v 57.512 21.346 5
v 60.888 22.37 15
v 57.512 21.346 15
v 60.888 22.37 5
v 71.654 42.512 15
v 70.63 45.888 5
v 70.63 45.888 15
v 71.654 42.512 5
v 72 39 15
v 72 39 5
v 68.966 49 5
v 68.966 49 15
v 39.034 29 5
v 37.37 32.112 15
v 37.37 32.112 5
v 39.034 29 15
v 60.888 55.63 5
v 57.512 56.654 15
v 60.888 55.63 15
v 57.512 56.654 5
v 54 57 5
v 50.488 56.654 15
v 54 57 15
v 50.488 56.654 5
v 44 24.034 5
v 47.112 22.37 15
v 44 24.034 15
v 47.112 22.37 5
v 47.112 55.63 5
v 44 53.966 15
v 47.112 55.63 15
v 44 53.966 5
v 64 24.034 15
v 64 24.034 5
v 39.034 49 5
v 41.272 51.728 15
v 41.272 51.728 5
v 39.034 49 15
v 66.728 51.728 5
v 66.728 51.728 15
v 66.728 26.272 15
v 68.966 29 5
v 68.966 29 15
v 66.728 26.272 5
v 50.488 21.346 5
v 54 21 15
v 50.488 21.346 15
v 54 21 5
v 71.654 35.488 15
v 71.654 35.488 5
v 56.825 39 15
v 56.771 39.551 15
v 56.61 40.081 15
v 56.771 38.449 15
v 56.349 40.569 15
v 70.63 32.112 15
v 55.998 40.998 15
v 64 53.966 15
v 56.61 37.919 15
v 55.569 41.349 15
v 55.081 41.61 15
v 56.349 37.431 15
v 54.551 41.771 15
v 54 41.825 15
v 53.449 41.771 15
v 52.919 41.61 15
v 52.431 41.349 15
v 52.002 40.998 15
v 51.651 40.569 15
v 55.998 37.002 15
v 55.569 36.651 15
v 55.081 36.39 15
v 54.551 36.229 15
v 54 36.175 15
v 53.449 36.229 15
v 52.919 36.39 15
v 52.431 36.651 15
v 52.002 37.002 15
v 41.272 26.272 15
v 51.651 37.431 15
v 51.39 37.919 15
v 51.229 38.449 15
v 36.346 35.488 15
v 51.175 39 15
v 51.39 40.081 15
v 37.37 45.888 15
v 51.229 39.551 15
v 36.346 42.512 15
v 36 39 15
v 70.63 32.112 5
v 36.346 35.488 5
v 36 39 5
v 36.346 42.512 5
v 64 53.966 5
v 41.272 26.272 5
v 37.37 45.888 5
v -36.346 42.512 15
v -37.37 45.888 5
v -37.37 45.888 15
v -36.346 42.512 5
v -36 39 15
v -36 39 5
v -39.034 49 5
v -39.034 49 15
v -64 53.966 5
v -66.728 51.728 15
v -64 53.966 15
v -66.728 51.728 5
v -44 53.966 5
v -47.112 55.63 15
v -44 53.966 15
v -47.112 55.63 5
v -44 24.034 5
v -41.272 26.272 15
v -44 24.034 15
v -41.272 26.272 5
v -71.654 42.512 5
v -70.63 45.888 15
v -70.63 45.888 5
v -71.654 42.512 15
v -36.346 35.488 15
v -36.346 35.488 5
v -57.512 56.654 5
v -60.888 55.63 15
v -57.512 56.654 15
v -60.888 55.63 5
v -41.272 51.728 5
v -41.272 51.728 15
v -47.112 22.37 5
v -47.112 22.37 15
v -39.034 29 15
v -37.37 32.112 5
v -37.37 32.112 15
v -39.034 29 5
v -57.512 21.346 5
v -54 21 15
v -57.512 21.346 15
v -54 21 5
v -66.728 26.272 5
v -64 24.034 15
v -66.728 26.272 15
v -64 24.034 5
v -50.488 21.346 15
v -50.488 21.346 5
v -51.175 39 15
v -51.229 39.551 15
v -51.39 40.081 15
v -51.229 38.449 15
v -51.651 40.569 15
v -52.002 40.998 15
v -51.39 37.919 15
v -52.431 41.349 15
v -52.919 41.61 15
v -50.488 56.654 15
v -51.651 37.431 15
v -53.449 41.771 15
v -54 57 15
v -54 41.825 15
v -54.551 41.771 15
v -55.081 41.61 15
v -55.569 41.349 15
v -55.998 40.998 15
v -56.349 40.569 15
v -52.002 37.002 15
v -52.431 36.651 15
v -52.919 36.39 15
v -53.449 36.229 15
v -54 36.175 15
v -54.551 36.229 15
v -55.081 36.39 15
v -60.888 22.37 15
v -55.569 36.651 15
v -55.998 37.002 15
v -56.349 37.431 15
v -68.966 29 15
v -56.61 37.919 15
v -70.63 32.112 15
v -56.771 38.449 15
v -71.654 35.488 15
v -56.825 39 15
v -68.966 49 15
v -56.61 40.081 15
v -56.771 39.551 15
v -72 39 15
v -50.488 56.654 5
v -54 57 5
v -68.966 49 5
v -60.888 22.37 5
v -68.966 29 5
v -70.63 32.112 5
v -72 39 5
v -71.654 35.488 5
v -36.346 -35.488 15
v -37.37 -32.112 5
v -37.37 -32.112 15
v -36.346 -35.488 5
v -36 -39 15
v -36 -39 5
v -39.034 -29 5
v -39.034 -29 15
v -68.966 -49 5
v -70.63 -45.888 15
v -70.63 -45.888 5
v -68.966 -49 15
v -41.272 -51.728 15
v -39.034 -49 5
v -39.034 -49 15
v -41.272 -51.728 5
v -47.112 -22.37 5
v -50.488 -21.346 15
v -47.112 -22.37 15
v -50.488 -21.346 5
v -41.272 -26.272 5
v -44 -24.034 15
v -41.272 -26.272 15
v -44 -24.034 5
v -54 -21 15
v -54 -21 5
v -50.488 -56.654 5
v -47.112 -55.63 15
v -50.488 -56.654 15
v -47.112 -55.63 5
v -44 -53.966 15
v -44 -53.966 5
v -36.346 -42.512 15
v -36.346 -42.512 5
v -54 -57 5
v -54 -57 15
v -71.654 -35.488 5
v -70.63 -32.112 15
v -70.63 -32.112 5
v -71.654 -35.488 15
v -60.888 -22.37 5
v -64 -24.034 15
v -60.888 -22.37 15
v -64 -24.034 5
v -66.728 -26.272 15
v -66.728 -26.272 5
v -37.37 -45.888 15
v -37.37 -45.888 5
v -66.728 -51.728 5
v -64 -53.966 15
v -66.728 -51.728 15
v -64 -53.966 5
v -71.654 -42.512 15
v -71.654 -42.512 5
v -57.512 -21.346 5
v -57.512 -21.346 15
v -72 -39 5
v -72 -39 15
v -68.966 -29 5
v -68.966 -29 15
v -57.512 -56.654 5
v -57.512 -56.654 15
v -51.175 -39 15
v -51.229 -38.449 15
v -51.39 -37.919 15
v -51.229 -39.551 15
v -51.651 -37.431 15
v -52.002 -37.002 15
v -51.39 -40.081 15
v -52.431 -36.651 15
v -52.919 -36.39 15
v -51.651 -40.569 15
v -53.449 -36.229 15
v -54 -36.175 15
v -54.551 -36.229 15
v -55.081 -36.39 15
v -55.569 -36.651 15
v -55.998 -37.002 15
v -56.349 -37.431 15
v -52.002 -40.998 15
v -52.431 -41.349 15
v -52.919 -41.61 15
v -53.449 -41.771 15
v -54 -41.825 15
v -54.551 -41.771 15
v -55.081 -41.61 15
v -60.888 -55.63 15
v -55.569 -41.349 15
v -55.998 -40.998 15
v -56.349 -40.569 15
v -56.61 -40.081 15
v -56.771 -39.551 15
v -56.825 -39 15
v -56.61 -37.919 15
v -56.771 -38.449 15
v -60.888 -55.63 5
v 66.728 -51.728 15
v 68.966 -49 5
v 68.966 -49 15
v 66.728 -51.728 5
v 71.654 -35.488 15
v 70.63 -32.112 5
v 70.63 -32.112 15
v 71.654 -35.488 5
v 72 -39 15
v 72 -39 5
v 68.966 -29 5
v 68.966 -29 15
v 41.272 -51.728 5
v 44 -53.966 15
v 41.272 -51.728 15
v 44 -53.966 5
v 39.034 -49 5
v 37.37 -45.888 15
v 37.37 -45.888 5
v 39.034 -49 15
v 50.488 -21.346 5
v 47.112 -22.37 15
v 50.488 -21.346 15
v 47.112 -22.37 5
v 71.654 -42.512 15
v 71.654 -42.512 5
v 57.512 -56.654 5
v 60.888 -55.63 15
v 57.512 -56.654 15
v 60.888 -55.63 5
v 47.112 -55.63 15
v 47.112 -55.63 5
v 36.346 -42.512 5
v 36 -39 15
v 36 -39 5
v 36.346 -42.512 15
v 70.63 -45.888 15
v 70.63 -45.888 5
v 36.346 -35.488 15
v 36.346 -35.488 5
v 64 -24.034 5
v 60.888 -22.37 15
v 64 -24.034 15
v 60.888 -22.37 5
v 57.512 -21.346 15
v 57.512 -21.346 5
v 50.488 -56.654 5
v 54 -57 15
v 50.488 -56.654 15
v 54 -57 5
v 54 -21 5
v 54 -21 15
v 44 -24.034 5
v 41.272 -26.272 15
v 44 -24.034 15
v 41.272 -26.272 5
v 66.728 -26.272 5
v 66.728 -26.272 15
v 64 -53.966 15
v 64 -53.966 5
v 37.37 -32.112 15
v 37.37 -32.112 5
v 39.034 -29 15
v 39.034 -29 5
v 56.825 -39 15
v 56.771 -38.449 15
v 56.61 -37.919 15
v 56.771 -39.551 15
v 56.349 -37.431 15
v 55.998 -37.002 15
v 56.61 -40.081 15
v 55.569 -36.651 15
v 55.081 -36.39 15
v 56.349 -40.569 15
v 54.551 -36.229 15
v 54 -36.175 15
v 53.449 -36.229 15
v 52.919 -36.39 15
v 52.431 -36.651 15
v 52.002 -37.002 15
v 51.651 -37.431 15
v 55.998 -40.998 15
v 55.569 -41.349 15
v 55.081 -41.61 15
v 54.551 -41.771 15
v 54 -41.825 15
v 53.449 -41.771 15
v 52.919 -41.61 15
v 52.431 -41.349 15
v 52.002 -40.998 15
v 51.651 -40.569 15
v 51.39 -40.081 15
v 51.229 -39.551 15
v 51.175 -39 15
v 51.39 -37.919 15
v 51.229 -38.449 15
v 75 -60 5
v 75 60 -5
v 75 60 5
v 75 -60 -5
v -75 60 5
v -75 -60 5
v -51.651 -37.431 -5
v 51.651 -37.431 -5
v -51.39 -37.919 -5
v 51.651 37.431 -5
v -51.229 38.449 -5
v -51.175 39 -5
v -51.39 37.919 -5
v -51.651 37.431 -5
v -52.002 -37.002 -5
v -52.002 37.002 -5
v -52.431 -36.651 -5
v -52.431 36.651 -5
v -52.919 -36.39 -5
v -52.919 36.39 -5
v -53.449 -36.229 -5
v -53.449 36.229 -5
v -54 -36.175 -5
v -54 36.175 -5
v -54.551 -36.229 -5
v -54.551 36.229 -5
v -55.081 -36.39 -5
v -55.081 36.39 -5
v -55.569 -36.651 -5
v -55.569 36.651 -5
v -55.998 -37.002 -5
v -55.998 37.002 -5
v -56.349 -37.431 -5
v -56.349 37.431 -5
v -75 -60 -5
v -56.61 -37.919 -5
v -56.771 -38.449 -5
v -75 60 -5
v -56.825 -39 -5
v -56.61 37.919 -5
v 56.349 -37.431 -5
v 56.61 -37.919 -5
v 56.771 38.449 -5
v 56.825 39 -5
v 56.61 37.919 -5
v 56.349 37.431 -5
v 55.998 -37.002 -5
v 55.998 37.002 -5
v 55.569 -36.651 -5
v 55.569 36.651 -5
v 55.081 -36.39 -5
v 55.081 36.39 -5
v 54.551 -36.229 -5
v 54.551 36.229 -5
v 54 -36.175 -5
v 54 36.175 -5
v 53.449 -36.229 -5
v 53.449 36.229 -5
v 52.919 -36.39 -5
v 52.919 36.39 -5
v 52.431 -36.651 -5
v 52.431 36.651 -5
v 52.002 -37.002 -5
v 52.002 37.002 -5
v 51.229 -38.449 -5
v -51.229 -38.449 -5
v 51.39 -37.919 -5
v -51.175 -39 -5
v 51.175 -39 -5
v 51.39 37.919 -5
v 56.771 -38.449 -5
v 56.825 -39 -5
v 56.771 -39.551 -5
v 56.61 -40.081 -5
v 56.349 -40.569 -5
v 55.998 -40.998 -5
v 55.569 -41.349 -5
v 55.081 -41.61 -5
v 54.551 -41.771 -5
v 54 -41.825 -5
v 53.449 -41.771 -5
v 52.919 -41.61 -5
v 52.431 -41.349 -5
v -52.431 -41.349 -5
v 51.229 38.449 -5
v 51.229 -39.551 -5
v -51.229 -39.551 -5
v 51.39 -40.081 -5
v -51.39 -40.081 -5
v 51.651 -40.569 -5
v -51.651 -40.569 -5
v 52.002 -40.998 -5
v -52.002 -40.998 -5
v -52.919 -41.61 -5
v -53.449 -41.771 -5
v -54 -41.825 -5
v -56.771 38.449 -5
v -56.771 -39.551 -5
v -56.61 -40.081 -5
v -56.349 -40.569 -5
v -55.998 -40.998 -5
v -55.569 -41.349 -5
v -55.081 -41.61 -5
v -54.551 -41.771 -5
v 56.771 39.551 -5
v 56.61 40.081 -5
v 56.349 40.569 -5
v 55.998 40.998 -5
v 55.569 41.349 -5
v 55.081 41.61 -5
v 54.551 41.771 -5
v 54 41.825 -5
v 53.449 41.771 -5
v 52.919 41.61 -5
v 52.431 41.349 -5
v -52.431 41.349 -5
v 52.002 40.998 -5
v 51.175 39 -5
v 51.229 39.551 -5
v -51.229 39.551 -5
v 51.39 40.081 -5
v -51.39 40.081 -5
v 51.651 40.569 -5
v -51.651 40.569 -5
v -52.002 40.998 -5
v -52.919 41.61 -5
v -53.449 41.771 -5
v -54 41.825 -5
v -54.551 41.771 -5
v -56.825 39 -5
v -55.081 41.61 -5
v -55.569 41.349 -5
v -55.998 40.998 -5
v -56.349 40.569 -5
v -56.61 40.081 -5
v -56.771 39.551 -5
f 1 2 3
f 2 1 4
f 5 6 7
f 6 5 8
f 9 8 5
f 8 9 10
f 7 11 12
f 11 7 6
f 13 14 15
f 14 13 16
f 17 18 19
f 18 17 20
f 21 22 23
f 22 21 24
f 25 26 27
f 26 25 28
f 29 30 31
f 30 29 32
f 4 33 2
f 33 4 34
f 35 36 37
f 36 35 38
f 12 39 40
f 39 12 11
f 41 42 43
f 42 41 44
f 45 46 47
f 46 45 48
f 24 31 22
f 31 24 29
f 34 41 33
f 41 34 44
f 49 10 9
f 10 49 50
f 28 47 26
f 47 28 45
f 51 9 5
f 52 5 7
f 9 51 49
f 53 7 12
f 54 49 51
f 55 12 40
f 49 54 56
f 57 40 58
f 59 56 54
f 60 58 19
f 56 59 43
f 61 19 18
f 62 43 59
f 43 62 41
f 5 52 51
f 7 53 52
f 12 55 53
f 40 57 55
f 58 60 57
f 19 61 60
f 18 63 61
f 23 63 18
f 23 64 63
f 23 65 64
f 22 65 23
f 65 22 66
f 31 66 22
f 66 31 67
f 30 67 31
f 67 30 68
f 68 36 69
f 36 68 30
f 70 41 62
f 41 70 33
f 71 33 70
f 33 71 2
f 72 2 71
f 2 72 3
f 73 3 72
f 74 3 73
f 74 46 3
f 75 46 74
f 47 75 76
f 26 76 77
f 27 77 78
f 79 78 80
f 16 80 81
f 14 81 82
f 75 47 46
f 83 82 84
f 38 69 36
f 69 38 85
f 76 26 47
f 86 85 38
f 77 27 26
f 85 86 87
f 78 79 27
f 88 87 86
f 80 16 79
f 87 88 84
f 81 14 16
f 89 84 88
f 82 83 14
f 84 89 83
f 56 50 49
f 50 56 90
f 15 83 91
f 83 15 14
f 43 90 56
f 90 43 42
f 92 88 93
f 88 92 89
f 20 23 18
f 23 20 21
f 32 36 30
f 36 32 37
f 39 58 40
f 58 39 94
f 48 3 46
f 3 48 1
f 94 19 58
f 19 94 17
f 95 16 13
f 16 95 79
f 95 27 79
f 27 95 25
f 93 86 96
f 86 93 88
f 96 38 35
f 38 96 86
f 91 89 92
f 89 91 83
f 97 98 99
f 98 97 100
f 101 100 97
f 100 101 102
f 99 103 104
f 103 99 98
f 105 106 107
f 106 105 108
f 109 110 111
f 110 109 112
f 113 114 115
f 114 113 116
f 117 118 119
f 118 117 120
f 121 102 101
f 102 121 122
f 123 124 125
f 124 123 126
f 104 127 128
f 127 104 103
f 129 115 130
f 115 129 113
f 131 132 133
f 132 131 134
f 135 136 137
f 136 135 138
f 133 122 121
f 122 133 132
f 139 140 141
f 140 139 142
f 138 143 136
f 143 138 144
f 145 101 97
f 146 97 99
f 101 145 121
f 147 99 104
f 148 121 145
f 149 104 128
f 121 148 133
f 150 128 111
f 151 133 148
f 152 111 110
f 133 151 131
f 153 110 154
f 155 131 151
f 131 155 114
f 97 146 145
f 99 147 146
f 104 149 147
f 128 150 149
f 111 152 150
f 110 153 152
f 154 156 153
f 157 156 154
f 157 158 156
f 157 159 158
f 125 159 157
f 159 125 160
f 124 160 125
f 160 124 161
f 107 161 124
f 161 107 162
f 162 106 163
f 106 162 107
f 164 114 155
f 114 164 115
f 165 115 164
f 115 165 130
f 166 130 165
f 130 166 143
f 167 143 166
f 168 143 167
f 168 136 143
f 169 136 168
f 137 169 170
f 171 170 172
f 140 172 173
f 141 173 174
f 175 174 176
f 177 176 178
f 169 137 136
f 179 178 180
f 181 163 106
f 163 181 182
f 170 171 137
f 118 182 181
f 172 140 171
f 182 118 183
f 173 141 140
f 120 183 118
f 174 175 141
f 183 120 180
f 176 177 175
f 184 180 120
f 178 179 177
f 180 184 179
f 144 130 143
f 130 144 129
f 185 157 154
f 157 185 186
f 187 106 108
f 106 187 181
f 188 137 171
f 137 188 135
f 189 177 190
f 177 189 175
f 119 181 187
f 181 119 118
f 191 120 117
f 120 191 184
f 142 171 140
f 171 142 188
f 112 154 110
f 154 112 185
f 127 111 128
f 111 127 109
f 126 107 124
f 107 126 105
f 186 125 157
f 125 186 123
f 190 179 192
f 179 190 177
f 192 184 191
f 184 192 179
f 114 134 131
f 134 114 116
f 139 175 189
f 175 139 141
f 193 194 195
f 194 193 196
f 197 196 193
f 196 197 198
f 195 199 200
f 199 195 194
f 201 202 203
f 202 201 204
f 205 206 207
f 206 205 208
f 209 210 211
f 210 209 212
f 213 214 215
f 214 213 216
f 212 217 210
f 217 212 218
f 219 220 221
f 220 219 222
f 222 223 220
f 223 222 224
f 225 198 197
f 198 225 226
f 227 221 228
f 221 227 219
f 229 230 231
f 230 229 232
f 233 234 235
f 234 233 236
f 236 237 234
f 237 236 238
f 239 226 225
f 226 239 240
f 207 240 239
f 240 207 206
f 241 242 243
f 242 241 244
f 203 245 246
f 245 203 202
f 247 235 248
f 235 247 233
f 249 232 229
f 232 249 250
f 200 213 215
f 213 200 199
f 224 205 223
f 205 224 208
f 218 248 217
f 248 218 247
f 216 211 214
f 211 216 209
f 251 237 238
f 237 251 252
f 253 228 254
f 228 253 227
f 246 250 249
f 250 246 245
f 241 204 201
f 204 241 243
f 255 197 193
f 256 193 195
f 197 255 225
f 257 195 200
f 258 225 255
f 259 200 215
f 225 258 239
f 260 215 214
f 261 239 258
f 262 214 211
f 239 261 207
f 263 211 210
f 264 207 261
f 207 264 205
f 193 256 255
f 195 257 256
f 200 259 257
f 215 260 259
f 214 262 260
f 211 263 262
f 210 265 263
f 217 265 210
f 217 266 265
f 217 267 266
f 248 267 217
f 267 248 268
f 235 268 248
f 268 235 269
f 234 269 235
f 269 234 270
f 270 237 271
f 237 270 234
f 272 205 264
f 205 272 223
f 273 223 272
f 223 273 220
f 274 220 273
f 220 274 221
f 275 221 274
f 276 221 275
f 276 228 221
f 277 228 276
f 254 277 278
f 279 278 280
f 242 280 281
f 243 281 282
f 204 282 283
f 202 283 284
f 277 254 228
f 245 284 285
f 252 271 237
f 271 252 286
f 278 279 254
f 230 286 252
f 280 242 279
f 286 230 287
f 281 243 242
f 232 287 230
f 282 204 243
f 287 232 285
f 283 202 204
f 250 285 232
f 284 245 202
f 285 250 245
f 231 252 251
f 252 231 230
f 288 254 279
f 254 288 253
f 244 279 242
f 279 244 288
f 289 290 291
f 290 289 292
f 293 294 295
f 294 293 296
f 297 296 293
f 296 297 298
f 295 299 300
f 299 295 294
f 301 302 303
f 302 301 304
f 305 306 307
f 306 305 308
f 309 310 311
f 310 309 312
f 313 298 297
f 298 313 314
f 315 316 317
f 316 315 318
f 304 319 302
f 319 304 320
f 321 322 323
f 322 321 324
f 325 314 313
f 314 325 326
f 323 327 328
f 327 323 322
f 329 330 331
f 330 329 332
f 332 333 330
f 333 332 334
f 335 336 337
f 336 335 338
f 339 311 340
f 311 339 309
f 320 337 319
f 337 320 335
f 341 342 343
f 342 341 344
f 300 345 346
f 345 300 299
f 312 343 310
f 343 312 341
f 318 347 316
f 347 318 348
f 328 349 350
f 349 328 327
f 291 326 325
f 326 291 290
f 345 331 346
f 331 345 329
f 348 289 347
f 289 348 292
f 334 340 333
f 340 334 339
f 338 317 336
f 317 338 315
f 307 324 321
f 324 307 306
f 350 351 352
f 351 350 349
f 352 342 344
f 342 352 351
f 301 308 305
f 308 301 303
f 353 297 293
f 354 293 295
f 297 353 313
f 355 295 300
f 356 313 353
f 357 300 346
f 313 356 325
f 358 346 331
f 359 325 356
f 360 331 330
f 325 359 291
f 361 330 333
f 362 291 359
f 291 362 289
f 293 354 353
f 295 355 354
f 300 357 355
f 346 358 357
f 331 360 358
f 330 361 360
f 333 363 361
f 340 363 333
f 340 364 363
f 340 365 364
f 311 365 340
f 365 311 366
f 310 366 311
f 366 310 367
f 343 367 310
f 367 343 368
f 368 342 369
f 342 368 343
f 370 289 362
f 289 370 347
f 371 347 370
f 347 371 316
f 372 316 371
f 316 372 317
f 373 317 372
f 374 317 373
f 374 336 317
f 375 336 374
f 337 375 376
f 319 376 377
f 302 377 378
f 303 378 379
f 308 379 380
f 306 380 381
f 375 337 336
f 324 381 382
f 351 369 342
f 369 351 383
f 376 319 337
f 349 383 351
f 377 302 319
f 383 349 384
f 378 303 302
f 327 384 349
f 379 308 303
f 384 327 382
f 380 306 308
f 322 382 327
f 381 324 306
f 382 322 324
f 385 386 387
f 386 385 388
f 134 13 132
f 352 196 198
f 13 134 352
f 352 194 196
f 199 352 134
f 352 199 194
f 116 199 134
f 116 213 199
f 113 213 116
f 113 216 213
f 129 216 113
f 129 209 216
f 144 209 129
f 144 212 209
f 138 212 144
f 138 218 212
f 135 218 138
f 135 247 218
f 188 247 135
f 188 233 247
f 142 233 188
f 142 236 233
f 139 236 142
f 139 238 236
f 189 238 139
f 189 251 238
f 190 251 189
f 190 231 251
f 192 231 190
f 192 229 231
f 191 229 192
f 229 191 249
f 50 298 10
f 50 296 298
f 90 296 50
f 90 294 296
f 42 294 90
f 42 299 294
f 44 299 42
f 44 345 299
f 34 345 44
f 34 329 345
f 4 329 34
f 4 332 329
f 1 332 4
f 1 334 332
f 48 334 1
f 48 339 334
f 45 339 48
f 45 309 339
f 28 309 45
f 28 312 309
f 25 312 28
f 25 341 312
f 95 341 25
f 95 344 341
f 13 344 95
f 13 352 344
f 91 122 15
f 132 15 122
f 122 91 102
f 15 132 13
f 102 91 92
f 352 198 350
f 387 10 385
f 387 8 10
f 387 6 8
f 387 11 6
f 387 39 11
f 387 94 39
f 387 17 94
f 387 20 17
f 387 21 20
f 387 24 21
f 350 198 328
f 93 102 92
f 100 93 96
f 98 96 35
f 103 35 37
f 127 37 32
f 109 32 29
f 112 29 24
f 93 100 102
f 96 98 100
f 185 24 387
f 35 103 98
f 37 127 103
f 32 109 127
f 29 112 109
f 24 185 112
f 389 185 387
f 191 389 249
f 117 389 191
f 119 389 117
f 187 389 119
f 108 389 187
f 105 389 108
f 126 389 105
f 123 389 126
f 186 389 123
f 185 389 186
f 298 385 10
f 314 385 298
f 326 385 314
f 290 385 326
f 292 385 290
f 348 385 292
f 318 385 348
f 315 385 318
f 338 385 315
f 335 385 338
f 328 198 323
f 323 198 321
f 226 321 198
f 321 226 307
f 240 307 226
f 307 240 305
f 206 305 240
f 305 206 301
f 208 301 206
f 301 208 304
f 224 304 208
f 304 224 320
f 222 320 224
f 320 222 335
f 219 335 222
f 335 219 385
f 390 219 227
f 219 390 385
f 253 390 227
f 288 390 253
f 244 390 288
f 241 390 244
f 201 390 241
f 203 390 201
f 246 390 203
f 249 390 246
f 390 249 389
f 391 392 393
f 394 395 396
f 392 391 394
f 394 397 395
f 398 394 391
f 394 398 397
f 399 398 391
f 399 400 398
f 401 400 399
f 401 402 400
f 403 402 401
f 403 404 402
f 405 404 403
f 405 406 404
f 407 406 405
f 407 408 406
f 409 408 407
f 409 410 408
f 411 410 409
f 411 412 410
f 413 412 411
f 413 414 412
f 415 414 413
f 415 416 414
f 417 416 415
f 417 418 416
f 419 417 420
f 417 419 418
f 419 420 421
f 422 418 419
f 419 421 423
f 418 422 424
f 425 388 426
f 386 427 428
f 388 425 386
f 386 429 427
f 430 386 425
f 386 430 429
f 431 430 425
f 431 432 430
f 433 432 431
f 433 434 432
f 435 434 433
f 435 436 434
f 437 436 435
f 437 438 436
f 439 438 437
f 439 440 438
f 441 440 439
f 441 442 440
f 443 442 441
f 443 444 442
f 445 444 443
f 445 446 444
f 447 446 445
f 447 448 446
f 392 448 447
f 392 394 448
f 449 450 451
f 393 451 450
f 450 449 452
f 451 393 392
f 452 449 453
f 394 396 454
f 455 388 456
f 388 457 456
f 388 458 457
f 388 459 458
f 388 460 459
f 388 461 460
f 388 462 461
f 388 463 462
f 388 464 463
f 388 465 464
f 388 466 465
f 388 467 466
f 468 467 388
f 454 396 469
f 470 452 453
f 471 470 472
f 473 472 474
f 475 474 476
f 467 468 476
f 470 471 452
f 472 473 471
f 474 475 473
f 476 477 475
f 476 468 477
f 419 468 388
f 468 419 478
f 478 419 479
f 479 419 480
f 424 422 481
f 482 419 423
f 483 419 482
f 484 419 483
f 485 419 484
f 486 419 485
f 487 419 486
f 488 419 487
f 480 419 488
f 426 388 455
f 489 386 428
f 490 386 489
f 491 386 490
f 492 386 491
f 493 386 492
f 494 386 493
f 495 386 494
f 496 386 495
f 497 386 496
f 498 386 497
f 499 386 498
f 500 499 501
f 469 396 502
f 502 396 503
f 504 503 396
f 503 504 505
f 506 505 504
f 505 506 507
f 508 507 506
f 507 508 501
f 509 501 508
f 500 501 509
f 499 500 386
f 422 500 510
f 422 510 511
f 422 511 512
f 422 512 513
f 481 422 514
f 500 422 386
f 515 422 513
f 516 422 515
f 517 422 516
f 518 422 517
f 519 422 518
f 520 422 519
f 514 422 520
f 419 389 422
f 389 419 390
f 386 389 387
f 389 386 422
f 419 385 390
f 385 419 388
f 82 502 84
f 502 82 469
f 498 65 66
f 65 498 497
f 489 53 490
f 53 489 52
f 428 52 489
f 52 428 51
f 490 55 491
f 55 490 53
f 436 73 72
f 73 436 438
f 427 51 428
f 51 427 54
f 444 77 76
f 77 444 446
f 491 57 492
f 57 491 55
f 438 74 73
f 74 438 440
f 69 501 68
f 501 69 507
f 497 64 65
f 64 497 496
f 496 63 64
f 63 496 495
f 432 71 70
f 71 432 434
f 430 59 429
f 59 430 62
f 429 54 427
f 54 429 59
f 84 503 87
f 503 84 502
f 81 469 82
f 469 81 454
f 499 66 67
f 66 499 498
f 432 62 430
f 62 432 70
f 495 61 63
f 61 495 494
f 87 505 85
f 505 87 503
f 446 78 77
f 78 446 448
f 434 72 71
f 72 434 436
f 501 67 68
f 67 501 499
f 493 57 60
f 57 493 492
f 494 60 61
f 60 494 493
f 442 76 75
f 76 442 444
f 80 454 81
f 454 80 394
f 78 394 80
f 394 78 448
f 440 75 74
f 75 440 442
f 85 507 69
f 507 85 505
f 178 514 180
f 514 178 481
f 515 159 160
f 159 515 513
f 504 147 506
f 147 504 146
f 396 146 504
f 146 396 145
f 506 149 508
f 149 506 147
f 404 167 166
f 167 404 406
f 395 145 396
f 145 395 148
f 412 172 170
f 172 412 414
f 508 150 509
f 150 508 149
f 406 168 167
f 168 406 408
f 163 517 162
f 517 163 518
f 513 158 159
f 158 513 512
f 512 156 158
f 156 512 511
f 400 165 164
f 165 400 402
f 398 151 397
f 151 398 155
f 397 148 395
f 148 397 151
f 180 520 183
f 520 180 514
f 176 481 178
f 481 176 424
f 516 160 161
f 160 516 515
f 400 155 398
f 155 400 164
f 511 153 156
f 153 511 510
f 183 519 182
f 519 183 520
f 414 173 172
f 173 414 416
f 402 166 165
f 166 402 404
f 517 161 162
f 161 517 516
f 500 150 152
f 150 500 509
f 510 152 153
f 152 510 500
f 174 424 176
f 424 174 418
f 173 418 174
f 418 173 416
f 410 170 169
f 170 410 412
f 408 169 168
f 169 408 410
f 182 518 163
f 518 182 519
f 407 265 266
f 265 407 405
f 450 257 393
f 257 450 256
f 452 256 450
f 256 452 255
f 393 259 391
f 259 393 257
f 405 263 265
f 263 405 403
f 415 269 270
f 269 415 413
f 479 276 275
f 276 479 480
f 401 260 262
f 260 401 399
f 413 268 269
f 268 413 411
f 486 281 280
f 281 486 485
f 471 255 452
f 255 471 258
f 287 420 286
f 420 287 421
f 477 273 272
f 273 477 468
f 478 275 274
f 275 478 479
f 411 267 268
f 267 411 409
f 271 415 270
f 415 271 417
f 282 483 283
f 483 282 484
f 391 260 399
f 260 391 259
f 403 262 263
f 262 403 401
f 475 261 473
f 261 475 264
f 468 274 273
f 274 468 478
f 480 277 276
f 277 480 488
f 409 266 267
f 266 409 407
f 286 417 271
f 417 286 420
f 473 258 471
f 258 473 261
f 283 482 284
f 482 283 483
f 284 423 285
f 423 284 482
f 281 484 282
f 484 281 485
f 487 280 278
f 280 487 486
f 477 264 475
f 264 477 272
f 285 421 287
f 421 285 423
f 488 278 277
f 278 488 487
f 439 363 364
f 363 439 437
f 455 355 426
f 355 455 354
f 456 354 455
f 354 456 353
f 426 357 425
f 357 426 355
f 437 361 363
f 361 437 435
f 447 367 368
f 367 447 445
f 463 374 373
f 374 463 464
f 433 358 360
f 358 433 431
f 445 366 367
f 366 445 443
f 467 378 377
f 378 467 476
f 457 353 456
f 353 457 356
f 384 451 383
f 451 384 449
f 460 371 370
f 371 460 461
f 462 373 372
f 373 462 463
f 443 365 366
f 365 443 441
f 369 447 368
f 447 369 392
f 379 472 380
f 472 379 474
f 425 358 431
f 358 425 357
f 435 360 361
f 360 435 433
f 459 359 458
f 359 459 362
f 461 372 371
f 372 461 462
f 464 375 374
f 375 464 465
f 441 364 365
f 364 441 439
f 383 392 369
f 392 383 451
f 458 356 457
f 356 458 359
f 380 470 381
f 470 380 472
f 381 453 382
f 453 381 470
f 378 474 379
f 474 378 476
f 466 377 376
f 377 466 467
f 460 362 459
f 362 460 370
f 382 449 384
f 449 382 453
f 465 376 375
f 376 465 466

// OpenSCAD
$fn = 32;

// ----------------------------------------------------------------------
// Anchor pads 150 x 120 x 20
// four corner bosses with anchor holes
// ----------------------------------------------------------------------

// --- parameters (mm) ---
plate = [150, 120, 10];  // base plate size (x, y, z)
pads = 4;                // boss count, one per corner
edge = 21;               // boss centre offset from the plate edge
boss_d = 36;             // boss diameter
boss_h = 10;             // boss height above the base plate
bore_d = 5.5;            // nominal hole diameter from the drawing
print_allowance = 0.15;  // clearance added for printing

// --- derived feature positions (mm) ---
hole_d = bore_d + print_allowance;  // = 5.65   hole diameter as printed
height = plate[2] + boss_h;         // = 20   overall height of the part
corner_x = plate[0] / 2 - edge;     // = 54   boss centre X
corner_y = plate[1] / 2 - edge;     // = 39   boss centre Y
feature_centers = [
  [corner_x, corner_y],
  [-corner_x, corner_y],
  [-corner_x, -corner_y],
  [corner_x, -corner_y]
];   // boss centres, anchor holes are drilled there

// base plate, four bosses standing on it, anchor holes all the way through
difference() {
  union() {
    cube(plate, center = true);
    for (centre = feature_centers)
      translate([centre[0], centre[1], plate[2] / 2 - 1])
        cylinder(d = boss_d, h = boss_h + 1);
  }
  for (centre = feature_centers)
    translate([centre[0], centre[1], -height])
      cylinder(d = hole_d, h = 2 * height + 2);  // through boss and plate
}
